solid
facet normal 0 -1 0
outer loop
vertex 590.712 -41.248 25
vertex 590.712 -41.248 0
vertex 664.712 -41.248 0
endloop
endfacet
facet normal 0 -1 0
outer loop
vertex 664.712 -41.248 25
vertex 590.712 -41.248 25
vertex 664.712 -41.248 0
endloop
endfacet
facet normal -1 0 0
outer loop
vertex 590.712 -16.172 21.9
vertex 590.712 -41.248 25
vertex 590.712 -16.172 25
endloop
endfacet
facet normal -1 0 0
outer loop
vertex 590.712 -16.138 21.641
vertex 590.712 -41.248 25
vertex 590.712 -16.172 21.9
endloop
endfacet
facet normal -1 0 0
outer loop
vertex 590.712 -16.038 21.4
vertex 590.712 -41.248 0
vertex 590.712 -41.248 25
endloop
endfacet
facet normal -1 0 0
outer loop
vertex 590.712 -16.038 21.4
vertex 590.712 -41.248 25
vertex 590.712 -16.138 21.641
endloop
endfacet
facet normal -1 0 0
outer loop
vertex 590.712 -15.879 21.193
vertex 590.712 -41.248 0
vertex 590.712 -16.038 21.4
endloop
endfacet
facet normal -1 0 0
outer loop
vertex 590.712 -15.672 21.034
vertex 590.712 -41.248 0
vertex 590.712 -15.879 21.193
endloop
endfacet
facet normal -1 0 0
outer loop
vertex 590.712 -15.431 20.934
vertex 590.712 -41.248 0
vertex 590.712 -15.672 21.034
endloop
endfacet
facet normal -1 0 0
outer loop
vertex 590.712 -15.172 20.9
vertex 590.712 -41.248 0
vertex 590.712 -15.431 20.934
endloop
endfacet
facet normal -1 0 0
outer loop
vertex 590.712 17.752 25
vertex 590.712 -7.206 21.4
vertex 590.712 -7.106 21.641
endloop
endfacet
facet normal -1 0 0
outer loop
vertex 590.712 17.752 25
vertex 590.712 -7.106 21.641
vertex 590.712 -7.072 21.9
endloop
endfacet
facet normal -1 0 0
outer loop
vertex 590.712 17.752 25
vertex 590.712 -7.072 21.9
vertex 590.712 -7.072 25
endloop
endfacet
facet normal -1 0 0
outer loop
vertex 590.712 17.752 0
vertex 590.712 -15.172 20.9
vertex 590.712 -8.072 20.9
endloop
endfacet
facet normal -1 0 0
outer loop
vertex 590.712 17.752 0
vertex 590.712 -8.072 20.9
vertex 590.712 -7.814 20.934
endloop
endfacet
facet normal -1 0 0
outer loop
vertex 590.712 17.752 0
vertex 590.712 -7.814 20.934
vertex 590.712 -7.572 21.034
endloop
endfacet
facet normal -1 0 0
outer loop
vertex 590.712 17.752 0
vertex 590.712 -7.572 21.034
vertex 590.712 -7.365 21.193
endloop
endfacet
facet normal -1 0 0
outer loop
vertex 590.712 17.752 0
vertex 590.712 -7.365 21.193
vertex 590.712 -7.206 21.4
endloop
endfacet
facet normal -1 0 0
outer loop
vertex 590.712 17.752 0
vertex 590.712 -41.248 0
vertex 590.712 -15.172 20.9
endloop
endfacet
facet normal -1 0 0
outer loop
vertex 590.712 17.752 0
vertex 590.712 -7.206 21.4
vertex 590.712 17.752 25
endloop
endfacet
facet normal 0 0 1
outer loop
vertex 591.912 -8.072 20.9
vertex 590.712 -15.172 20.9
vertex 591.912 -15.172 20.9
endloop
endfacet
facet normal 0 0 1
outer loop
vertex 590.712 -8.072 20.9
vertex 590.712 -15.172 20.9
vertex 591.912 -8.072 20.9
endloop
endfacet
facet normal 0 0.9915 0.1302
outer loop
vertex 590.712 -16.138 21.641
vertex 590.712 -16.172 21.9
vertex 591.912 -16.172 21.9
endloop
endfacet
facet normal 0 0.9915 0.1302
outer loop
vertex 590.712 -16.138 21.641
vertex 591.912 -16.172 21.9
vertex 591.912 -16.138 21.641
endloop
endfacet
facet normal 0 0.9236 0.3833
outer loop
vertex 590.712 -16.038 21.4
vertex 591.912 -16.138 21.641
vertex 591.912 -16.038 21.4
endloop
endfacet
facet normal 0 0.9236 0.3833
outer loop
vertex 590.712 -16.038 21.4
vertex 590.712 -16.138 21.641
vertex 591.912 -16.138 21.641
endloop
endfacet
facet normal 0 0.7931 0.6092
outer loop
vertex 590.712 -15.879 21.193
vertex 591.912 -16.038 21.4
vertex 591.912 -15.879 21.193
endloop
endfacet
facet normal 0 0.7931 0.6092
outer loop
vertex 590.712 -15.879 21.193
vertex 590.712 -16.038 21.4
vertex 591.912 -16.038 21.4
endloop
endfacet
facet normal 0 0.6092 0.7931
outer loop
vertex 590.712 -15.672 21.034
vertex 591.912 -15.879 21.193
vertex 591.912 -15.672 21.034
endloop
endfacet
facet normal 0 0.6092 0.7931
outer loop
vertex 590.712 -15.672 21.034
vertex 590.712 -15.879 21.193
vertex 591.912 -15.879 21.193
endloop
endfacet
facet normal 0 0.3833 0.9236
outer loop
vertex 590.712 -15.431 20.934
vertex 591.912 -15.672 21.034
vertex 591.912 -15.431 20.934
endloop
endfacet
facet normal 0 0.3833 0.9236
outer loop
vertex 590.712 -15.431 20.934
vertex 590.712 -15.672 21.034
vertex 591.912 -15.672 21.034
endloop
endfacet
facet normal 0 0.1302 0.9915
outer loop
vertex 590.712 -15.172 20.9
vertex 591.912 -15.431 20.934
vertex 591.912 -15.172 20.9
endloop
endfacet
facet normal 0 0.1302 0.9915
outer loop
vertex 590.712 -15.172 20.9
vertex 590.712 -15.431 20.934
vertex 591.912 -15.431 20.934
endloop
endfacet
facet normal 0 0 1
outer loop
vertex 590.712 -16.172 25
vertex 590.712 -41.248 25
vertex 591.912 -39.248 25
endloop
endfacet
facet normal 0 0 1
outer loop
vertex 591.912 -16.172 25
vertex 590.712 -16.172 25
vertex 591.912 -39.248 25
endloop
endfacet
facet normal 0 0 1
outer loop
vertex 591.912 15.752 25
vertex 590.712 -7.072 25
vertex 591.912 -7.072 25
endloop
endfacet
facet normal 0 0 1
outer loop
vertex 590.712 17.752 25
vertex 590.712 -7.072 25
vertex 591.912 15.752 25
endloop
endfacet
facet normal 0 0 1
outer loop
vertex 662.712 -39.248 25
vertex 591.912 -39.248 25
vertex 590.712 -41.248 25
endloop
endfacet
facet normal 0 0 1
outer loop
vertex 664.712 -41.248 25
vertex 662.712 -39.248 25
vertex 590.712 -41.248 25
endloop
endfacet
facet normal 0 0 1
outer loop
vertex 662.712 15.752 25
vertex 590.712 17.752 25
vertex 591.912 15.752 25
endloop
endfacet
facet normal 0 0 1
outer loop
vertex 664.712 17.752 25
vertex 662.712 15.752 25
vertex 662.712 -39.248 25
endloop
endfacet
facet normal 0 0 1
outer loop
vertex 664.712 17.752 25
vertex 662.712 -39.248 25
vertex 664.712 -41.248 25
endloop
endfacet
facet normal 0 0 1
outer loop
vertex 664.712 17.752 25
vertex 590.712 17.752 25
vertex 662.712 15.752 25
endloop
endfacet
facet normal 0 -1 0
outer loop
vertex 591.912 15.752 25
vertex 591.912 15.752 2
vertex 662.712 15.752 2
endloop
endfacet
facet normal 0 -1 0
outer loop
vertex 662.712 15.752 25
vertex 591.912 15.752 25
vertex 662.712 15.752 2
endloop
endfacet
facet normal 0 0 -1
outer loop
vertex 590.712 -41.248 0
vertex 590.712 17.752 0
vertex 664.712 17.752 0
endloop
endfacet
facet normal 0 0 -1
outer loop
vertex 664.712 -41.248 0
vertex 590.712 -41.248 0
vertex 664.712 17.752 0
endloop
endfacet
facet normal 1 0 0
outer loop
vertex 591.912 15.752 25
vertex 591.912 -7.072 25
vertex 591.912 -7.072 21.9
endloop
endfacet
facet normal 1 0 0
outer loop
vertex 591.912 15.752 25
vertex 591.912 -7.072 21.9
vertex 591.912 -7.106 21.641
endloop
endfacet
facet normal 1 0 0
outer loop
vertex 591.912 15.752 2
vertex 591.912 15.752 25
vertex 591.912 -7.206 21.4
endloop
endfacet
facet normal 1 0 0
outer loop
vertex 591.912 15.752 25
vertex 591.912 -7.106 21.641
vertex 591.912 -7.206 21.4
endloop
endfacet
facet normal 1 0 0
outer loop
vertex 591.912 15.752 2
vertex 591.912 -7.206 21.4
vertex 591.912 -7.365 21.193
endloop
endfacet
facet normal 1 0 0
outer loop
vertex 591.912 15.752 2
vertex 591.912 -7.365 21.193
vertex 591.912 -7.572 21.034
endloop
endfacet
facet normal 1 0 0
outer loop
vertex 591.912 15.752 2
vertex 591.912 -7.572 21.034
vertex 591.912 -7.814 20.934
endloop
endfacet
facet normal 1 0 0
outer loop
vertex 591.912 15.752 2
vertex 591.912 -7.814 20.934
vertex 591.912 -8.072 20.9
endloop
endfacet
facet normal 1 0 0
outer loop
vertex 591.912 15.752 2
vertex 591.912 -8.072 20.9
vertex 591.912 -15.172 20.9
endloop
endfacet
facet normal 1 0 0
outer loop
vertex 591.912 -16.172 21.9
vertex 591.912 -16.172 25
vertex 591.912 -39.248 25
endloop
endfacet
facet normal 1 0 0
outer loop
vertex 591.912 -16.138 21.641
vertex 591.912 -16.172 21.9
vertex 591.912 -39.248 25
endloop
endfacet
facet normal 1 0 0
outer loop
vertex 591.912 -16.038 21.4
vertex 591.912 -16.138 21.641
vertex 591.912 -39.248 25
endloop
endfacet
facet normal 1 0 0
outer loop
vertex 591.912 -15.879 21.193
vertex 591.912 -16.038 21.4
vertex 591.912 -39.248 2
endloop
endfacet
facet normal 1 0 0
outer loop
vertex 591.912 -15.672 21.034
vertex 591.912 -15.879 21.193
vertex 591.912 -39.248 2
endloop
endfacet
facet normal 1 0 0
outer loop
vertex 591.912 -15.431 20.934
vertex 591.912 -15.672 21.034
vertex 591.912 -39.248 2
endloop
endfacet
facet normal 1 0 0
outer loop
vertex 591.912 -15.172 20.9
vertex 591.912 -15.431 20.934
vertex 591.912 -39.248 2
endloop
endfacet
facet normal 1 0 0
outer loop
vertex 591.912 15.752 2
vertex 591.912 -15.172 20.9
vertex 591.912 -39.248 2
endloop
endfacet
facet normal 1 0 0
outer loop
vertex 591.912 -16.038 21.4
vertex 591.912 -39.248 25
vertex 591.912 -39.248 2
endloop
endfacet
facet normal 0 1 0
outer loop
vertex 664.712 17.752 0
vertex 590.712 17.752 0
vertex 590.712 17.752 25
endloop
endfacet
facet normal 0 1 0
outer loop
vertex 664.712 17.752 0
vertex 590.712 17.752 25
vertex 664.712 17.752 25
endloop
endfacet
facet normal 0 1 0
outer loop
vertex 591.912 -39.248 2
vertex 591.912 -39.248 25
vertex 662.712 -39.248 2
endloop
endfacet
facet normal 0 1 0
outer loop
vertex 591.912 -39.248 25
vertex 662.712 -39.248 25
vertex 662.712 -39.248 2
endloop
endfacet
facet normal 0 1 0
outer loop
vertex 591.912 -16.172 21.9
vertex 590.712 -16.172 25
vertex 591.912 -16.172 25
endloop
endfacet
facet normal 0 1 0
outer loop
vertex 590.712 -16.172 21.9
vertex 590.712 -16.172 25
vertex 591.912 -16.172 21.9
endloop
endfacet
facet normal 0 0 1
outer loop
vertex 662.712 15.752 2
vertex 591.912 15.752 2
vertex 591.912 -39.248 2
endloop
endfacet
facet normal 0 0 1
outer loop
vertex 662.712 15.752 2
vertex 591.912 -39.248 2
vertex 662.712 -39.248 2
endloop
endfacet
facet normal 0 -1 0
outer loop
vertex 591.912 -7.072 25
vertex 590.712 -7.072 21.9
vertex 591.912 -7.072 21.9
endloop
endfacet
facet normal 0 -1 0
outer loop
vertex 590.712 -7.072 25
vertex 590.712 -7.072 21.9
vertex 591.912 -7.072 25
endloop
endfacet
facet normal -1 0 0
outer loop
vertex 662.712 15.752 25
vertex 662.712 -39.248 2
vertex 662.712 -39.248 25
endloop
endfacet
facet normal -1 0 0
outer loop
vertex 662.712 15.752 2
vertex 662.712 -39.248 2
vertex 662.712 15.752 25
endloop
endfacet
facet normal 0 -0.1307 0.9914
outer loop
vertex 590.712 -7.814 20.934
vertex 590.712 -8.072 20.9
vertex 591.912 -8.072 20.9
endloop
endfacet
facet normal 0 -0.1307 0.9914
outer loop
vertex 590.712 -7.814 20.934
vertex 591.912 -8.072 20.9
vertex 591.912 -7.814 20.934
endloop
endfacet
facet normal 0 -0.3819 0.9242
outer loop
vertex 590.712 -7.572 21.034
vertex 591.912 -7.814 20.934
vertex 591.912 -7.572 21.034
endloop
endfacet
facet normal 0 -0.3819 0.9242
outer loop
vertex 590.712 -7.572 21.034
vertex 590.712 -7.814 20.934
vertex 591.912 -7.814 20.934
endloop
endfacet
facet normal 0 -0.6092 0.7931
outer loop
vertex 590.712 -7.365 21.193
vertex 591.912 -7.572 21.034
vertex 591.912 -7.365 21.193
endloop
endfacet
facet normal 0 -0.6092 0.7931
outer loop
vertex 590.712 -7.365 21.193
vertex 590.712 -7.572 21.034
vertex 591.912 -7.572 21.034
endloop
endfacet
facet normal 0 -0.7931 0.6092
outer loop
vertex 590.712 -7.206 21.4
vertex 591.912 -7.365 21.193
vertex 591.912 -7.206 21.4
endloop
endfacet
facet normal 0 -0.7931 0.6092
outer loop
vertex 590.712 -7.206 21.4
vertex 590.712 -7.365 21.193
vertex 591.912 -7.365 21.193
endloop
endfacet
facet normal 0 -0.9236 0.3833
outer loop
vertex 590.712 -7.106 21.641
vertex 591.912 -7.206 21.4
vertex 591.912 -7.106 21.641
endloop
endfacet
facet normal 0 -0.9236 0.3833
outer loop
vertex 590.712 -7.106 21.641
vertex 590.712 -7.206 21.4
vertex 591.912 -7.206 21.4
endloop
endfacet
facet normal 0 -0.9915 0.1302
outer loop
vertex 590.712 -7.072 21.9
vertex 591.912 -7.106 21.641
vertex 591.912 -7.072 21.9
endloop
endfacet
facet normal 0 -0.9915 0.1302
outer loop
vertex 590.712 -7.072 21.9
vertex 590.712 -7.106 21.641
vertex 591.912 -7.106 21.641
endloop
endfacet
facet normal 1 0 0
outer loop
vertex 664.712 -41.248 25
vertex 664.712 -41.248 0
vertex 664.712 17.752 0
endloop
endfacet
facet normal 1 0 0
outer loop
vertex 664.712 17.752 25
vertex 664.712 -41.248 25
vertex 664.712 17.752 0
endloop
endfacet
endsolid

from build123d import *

# Parameters (mm, degrees)
CROQUIS1_W                  = 74
CROQUIS1_H                  = 59
SALIENTE_EXTRUIR1_DEPTH     = 25
VACIADO1_T                  = -2
VACIADO1_THICKNESS_2_FACE_W = 23
VACIADO1_THICKNESS_2_FACE_H = 55
VACIADO1_THICKNESS_2_DEPTH  = 0.8
CORTAR_EXTRUIR1_DEPTH       = 1.2


with BuildPart() as part:
    # Croquis1 → Saliente-Extruir1 (new body)
    with BuildSketch(Plane.XY):
        with Locations((627.712029931, -11.748201439)):
            Rectangle(CROQUIS1_W, CROQUIS1_H)
    extrude(amount=SALIENTE_EXTRUIR1_DEPTH)

    # Vaciado1
    vaciado1_openings = [part.faces().sort_by_distance(p)[0] for p in [
        (627.712029931, -11.748201439, 25),
    ]]
    offset(amount=VACIADO1_T, openings=vaciado1_openings, kind=Kind.INTERSECTION)

    # Vaciado1 thickness 2 face (on inner face of the shell) → Vaciado1 thickness 2 (cut)
    with BuildSketch(Plane(origin=(592.712029931, -11.748201439, 13.5), x_dir=(0, 0, -1), z_dir=(-1, 0, 0))):
        Rectangle(VACIADO1_THICKNESS_2_FACE_W, VACIADO1_THICKNESS_2_FACE_H)
    extrude(amount=VACIADO1_THICKNESS_2_DEPTH, mode=Mode.SUBTRACT)

    # Croquis2 → Cortar-Extruir1 (cut)
    with BuildSketch(Plane.ZY.offset(-590.712029931)):
        with BuildLine():
            Line((21.9, -7.072321113), (25, -7.072321113))
            Line((25, -7.072321113), (25, -16.172321113))
            Line((25, -16.172321113), (21.9, -16.172321113))
            ThreePointArc((21.9, -16.172321113), (21.192893219, -15.879427895), (20.9, -15.172321113))
            Line((20.9, -15.172321113), (20.9, -8.072321113))
            ThreePointArc((20.9, -8.072321113), (21.192893219, -7.365214332), (21.9, -7.072321113))
        make_face()
    extrude(amount=-CORTAR_EXTRUIR1_DEPTH, mode=Mode.SUBTRACT)


solid = part.part
